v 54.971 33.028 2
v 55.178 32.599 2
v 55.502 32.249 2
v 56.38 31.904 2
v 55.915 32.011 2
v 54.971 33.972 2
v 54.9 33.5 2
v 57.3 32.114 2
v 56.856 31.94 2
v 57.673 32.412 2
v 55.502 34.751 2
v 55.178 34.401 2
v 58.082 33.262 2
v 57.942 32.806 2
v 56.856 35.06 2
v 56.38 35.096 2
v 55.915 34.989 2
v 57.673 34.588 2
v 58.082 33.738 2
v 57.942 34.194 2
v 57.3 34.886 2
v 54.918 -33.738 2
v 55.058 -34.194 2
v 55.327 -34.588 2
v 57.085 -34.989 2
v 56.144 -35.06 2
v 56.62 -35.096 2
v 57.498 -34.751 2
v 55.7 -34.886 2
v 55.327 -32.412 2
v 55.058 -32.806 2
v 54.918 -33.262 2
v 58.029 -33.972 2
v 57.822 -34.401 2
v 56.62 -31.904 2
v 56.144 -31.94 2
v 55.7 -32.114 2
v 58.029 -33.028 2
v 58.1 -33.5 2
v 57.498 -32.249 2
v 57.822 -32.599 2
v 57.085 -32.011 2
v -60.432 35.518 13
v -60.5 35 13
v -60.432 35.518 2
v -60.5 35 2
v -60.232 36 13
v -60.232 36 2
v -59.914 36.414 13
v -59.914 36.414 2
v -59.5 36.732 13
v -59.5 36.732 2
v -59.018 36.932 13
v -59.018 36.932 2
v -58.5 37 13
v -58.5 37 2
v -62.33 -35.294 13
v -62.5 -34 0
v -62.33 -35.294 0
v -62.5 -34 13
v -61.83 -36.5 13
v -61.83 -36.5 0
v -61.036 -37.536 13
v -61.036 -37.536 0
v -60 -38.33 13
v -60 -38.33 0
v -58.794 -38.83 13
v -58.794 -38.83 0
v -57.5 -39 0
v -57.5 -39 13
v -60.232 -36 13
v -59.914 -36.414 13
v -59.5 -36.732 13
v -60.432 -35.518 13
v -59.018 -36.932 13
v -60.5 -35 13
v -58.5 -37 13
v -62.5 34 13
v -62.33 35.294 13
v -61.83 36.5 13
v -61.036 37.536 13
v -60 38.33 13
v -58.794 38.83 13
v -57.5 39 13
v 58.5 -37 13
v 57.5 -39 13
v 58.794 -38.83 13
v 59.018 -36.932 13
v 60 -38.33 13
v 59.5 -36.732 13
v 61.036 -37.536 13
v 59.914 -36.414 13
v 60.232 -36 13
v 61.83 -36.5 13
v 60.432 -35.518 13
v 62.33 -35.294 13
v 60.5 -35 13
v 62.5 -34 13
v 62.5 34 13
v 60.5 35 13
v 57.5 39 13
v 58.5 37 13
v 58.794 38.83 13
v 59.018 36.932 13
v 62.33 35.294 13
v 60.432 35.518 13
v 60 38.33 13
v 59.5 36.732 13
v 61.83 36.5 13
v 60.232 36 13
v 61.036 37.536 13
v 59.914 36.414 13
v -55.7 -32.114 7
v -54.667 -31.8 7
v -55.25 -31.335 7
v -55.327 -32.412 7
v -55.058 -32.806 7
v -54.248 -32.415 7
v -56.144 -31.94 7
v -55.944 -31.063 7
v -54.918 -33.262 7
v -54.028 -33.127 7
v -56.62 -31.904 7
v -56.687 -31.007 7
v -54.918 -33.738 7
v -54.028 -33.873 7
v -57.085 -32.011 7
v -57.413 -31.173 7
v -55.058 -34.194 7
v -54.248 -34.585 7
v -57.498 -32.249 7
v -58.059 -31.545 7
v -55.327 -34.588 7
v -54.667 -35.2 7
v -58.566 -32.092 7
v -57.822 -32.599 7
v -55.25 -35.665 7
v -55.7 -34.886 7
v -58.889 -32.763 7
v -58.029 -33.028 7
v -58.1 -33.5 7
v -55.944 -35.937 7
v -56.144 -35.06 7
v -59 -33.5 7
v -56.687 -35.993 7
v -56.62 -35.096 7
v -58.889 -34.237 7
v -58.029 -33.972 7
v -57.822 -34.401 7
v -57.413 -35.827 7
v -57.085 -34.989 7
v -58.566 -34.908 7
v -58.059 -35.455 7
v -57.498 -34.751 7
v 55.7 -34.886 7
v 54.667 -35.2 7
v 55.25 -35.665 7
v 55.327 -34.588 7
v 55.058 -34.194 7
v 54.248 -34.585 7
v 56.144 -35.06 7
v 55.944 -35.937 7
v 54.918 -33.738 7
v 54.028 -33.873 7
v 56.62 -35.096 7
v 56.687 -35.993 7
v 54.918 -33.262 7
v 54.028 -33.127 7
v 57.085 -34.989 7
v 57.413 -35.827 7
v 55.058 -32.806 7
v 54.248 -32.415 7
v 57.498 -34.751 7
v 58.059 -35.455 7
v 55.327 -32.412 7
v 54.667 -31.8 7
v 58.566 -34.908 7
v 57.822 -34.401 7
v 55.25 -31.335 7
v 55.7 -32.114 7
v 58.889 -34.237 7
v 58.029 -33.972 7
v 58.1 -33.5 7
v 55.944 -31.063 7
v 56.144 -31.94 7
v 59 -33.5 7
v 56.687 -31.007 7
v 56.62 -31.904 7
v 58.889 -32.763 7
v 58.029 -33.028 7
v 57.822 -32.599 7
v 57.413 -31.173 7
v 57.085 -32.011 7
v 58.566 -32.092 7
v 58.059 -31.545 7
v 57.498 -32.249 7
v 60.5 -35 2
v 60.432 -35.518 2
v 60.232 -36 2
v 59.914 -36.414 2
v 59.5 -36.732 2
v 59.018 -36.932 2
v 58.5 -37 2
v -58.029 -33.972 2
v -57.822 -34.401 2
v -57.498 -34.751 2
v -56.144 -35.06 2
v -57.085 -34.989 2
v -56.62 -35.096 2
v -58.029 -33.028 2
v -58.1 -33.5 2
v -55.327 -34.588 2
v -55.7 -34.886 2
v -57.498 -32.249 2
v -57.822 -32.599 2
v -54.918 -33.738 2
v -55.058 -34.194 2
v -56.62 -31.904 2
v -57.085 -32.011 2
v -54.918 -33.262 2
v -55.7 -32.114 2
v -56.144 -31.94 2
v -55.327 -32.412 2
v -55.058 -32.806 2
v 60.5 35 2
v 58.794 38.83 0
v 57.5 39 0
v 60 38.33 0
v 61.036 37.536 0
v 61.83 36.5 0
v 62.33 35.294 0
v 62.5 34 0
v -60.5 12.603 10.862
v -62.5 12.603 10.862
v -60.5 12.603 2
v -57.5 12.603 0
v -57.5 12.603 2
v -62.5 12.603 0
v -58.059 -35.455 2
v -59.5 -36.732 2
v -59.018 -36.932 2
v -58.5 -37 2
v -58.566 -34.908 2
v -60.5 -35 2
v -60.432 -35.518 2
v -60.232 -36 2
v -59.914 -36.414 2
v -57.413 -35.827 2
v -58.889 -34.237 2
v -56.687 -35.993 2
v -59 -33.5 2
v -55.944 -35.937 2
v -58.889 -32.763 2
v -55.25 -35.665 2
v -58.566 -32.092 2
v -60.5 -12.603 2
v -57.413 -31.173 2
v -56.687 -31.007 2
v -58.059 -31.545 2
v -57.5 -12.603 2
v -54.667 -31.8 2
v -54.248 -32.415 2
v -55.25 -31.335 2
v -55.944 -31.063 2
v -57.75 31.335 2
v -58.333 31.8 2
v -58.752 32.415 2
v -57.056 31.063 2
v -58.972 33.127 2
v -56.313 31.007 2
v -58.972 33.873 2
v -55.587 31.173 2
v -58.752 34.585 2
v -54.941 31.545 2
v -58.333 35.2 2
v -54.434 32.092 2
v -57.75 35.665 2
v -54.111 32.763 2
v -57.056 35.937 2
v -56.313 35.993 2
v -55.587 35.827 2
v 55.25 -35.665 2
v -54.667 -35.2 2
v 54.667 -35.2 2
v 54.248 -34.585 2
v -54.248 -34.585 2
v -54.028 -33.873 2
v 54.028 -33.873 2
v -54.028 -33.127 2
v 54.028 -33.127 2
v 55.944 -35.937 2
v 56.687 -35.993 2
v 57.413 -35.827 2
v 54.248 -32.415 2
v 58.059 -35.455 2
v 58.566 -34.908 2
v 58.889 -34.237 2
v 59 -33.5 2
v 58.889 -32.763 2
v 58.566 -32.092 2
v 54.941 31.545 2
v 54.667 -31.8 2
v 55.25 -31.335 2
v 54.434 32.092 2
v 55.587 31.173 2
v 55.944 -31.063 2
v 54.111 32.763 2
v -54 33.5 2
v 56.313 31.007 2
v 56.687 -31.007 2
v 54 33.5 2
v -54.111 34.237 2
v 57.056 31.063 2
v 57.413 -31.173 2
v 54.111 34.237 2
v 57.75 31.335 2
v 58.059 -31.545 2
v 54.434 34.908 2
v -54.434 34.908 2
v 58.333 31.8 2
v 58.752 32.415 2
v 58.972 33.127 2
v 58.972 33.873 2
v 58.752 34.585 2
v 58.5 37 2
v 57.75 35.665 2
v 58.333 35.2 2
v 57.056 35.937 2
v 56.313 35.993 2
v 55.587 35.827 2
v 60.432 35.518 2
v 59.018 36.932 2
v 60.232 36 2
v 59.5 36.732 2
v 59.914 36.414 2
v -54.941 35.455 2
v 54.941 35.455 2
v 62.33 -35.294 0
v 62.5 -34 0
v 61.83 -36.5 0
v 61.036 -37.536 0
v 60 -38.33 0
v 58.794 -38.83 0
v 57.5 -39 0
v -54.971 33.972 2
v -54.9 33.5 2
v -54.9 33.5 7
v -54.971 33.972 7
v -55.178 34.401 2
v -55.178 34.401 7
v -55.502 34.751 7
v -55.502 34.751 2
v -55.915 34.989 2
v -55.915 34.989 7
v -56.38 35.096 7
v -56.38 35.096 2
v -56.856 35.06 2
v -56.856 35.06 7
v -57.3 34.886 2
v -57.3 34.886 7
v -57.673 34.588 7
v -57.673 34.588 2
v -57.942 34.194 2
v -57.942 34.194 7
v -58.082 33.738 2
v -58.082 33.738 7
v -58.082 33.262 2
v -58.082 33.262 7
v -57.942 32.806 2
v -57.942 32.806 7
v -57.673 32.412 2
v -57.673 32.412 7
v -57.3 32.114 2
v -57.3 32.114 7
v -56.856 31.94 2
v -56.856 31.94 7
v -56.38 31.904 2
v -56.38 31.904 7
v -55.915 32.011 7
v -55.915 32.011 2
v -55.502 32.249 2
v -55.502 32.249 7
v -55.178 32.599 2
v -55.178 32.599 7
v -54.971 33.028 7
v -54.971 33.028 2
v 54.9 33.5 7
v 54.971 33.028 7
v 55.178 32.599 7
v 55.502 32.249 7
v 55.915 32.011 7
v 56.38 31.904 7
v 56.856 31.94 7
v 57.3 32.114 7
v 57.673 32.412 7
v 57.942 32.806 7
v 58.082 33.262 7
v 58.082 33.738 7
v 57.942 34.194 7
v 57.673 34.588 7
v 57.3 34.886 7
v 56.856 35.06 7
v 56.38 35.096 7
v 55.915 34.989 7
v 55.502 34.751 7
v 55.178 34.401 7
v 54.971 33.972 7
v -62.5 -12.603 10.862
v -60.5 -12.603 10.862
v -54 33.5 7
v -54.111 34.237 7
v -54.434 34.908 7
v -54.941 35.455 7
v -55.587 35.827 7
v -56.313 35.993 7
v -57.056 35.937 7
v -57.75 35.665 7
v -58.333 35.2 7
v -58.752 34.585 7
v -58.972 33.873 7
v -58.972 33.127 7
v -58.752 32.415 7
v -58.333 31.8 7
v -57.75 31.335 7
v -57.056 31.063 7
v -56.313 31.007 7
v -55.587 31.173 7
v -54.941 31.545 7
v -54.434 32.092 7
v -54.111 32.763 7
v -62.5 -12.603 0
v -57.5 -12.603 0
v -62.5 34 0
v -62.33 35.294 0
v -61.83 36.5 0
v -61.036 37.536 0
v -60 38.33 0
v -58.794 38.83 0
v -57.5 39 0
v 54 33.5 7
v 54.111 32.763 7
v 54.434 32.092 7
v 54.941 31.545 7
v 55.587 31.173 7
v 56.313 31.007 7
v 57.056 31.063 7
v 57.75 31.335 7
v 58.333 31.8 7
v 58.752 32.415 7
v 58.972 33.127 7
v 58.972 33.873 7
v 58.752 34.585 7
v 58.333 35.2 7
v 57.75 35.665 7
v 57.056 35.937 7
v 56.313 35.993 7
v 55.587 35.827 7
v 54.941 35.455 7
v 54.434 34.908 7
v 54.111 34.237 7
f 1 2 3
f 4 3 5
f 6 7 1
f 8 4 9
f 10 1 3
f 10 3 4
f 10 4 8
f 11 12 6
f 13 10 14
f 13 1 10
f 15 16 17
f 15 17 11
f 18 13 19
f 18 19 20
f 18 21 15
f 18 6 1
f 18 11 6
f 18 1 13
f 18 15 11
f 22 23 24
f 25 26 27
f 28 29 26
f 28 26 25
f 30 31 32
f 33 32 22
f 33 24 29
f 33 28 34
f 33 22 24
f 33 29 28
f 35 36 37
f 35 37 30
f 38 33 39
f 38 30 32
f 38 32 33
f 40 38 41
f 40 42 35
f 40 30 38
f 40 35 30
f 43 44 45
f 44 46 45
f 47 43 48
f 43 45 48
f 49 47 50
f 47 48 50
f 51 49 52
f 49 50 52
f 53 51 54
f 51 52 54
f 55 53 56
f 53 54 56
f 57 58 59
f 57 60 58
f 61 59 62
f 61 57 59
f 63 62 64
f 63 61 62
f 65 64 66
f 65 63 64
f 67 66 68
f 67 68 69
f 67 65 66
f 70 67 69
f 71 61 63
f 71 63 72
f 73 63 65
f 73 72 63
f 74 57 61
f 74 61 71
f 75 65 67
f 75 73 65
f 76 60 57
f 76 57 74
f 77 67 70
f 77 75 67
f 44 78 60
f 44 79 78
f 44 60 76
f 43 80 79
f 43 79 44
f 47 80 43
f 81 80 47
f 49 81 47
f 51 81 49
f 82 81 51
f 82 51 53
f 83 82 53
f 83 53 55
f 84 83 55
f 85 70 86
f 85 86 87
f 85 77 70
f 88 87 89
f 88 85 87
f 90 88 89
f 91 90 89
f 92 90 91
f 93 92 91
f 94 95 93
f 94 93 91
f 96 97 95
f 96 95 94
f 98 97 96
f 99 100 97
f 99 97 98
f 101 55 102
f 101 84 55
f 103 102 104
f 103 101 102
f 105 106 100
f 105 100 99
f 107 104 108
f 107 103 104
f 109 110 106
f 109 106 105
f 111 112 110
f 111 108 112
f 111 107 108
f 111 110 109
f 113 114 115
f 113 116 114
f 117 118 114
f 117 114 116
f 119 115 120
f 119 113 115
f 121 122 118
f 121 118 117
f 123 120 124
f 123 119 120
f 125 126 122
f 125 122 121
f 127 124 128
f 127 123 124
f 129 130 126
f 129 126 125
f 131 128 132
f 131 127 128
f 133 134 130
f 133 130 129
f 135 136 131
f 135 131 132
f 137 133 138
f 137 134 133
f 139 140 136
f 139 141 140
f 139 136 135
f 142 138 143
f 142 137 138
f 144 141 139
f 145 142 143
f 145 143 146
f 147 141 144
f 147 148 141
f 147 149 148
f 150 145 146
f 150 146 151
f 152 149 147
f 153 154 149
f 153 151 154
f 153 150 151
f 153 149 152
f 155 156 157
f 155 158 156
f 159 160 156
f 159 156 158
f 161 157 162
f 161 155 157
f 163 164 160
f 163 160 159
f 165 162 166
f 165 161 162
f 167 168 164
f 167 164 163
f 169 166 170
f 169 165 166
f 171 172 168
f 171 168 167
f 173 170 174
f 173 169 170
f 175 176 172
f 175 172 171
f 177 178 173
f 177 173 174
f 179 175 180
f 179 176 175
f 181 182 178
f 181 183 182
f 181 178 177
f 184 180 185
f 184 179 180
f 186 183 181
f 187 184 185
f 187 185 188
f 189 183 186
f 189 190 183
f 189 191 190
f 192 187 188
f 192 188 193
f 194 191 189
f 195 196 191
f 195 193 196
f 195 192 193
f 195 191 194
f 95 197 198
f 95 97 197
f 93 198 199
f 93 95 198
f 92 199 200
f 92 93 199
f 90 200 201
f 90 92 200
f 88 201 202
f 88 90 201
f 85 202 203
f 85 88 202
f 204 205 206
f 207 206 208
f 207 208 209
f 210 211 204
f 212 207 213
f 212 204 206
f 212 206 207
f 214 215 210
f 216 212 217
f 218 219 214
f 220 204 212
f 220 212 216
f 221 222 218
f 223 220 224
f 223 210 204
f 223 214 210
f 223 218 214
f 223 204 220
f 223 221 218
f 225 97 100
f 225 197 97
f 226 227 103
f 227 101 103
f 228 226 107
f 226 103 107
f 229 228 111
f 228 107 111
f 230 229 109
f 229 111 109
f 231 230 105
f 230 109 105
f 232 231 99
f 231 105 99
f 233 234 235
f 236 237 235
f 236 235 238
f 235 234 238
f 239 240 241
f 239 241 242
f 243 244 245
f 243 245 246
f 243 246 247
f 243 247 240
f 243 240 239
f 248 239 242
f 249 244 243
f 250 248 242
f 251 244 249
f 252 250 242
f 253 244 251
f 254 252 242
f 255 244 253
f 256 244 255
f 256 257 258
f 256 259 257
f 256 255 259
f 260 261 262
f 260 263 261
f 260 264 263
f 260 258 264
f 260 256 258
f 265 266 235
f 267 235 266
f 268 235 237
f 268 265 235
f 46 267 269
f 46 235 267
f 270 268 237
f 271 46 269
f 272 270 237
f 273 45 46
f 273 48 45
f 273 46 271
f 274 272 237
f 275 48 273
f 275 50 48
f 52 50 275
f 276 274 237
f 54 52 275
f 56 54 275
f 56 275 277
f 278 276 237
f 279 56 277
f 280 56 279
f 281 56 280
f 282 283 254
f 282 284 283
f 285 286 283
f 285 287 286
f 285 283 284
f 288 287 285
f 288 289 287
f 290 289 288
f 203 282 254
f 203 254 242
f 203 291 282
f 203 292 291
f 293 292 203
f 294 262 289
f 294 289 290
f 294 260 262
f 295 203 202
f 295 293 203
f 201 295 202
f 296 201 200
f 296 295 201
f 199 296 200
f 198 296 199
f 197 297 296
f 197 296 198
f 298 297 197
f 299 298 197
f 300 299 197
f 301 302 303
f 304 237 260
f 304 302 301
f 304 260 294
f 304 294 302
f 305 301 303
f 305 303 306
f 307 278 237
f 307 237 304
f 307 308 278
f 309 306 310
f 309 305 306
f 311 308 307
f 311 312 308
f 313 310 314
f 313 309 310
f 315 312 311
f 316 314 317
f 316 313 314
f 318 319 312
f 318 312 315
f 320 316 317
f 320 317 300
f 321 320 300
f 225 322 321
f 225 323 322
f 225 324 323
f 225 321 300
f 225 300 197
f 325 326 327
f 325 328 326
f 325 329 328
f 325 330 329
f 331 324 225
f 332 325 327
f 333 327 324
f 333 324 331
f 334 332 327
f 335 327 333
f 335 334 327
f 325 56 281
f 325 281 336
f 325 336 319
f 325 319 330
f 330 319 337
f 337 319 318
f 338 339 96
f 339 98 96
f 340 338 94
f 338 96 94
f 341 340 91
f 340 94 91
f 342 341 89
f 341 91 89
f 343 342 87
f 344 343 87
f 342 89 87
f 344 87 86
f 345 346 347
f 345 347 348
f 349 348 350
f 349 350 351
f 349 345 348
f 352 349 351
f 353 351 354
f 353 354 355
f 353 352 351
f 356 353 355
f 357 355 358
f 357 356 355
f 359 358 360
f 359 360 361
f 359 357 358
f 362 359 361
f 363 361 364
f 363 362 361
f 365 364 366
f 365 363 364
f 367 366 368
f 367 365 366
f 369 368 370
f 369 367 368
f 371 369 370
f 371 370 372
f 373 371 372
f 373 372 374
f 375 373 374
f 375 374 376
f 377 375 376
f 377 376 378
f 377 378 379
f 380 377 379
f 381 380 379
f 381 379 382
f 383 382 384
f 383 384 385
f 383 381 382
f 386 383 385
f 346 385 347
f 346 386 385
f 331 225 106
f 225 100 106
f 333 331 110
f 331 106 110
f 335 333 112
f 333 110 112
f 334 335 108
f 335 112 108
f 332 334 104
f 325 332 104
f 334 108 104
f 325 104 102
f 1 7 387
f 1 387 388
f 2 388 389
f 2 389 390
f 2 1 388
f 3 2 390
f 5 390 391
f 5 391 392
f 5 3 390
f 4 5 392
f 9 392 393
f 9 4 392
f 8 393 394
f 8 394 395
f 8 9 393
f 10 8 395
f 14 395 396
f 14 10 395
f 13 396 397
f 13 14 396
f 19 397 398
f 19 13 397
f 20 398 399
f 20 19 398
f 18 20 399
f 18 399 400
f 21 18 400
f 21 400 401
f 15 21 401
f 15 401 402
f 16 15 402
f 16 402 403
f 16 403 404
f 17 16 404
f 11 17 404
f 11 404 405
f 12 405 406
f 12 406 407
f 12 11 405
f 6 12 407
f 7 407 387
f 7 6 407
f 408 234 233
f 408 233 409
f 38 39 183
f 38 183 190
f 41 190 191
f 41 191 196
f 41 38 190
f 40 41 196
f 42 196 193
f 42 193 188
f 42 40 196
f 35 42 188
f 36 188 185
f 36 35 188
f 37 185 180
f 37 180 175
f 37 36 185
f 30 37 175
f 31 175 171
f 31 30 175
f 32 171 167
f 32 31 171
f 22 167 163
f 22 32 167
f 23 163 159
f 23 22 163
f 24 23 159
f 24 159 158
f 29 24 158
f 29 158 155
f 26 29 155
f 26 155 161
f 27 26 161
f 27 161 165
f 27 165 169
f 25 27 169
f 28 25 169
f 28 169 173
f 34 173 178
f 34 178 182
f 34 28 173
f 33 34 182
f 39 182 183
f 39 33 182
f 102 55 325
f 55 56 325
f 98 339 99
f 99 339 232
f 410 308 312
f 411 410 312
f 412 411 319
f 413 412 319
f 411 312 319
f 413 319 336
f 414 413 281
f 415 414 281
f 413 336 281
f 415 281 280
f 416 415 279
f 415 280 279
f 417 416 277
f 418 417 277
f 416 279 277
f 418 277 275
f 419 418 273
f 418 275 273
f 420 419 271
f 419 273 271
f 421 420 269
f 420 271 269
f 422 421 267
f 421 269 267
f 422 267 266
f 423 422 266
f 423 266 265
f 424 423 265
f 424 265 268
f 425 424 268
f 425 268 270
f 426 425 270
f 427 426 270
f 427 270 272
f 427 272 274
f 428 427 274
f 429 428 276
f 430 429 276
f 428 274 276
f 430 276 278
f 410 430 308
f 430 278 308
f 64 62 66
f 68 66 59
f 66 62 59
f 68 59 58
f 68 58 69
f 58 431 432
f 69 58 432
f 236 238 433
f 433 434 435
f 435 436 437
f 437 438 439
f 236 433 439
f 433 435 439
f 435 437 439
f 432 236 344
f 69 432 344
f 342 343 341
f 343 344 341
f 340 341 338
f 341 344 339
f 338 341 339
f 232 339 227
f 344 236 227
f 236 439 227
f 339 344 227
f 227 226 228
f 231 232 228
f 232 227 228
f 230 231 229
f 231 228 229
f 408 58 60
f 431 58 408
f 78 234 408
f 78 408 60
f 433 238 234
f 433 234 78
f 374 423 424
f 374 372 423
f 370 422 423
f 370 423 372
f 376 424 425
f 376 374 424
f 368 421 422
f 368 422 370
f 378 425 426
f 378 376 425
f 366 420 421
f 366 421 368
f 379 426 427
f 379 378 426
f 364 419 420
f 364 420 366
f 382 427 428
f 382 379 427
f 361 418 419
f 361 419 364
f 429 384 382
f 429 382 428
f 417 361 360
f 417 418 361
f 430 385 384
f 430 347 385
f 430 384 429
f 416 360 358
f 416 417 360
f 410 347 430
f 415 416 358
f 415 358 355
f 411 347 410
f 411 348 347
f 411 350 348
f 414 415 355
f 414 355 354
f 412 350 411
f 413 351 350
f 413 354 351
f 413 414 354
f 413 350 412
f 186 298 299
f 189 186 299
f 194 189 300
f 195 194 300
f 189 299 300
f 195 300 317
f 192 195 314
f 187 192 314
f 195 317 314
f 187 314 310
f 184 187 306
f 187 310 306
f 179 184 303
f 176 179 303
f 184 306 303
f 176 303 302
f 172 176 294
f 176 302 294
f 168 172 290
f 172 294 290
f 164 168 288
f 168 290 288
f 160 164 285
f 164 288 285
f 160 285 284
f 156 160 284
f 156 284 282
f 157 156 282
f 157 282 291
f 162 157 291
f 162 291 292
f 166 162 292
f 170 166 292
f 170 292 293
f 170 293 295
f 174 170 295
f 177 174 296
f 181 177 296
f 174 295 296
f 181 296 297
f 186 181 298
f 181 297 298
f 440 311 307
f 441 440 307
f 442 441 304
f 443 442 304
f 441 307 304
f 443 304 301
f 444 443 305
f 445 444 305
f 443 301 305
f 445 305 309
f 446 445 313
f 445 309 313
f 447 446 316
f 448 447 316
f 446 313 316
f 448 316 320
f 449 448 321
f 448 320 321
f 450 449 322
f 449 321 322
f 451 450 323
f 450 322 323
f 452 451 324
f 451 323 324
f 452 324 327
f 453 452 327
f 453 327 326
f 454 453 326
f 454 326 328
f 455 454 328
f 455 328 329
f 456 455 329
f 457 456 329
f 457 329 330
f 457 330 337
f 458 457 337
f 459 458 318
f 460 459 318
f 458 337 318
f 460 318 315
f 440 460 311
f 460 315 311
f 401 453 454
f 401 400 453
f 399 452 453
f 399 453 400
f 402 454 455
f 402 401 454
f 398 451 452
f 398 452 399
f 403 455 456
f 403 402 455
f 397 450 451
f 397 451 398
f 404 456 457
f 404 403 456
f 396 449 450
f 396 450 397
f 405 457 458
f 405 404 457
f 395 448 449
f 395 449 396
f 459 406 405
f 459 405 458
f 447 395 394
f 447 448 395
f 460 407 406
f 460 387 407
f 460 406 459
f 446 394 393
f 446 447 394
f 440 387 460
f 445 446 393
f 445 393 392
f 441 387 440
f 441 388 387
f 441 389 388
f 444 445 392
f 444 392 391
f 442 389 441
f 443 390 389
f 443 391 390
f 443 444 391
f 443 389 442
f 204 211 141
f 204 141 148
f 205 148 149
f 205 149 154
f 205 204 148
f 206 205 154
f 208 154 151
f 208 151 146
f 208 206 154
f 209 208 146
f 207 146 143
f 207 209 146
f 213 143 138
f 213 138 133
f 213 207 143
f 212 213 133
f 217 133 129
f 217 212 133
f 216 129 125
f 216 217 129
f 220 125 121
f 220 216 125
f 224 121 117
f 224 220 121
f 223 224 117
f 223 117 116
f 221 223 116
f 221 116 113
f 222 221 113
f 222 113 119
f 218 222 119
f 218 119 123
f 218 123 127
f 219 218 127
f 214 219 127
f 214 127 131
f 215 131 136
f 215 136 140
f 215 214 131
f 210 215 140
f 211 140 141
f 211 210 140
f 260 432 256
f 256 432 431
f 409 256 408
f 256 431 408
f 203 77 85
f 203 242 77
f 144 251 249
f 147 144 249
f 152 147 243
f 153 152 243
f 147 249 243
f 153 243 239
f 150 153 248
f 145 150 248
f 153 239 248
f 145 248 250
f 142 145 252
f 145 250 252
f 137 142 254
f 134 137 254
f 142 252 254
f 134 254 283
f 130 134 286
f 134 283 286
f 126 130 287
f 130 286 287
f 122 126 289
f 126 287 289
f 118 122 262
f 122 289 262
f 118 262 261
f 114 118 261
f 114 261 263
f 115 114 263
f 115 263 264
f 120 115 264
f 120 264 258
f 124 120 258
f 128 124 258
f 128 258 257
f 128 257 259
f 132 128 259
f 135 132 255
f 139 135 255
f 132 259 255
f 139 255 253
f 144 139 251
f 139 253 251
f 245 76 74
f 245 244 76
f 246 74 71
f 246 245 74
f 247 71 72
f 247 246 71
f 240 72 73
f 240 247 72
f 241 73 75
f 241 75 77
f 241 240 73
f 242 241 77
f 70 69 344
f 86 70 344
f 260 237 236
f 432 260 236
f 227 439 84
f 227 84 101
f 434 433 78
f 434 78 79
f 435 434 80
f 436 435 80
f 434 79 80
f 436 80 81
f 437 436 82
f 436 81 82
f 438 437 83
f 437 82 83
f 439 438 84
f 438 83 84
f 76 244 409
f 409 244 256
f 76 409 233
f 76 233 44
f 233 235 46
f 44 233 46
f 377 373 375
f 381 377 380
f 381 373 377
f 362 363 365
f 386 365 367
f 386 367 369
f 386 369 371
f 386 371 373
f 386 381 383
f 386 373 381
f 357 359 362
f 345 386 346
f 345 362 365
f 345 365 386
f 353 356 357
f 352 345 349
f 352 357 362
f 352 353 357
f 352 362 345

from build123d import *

# Parameters (mm, degrees)
SKETCH_1_W          = 125
SKETCH_1_H          = 78
SKETCH_1_R          = 3.6
SKETCH_1_R_2        = 1.6
SKETCH_1_W_2        = 120
SKETCH_1_H_2        = 74
EXTRUDE_1_DEPTH     = 13
SHELL_1_T           = -2
SKETCH_3_R          = 2.5
SKETCH_3_R_2        = 1.6
EXTRUDE_2_DEPTH     = 5
CUT_EXTRUDE_1_DEPTH = 5
FILLET_1_R          = 5
FILLET_2_R          = 2


with BuildPart() as part:
    # 草图1 → 凸台-拉伸1 (new body)
    # profile 1 of 6: a face of its own
    with BuildSketch(Plane.XY):
        Rectangle(SKETCH_1_W, SKETCH_1_H)
        with Locations((-57, -33.5)):
            Circle(SKETCH_1_R, mode=Mode.SUBTRACT)
        with Locations((-57, 33.5)):
            Circle(SKETCH_1_R, mode=Mode.SUBTRACT)
        with Locations((57, -33.5)):
            Circle(SKETCH_1_R, mode=Mode.SUBTRACT)
        with Locations((57, 33.5)):
            Circle(SKETCH_1_R, mode=Mode.SUBTRACT)
    # profile 2 of 6: a face of its own
    with BuildSketch(Plane.XY):
        with Locations((57, 33.5)):
            Circle(SKETCH_1_R)
        with Locations((57, 33.5)):
            Circle(SKETCH_1_R_2, mode=Mode.SUBTRACT)
    # profile 3 of 6: a face of its own
    with BuildSketch(Plane.XY):
        with Locations((-57, -33.5)):
            Circle(SKETCH_1_R)
        with Locations((-57, -33.5)):
            Circle(SKETCH_1_R_2, mode=Mode.SUBTRACT)
    # profile 4 of 6: a face of its own
    with BuildSketch(Plane.XY):
        with Locations((57, -33.5)):
            Circle(SKETCH_1_R)
        with Locations((57, -33.5)):
            Circle(SKETCH_1_R_2, mode=Mode.SUBTRACT)
    # profile 5 of 6: a face of its own
    with BuildSketch(Plane.XY):
        with Locations((-57, 33.5)):
            Circle(SKETCH_1_R)
        with Locations((-57, 33.5)):
            Circle(SKETCH_1_R_2, mode=Mode.SUBTRACT)
    # profile 6 of 6: a face of its own
    with BuildSketch(Plane.XY):
        Rectangle(SKETCH_1_W_2, SKETCH_1_H_2)
    extrude(amount=EXTRUDE_1_DEPTH)

    # 抽壳1
    shell_1_openings = [part.faces().sort_by_distance(p)[0] for p in [
        (0, 0, 13),
    ]]
    offset(amount=SHELL_1_T, openings=shell_1_openings, kind=Kind.INTERSECTION)

    # 草图3 → 凸台-拉伸2 (add)
    # profile 1 of 4: a face of its own
    with BuildSketch(Plane.XY.offset(2)):
        with Locations((-56.5, 33.5)):
            Circle(SKETCH_3_R)
        with Locations((-56.5, 33.5)):
            Circle(SKETCH_3_R_2, mode=Mode.SUBTRACT)
    # profile 2 of 4: a face of its own
    with BuildSketch(Plane.XY.offset(2)):
        with Locations(Location((56.5, 33.5, 0), (0, 0, 180))):
            Circle(SKETCH_3_R)
        with Locations(Location((56.5, 33.5, 0), (0, 0, 180))):
            Circle(SKETCH_3_R_2, mode=Mode.SUBTRACT)
    # profile 3 of 4: a face of its own
    with BuildSketch(Plane.XY.offset(2)):
        with Locations((56.5, -33.5)):
            Circle(SKETCH_3_R)
        with Locations((56.5, -33.5)):
            Circle(SKETCH_3_R_2, mode=Mode.SUBTRACT)
    # profile 4 of 4: a face of its own
    with BuildSketch(Plane.XY.offset(2)):
        with Locations(Location((-56.5, -33.5, 0), (0, 0, 180))):
            Circle(SKETCH_3_R)
        with Locations(Location((-56.5, -33.5, 0), (0, 0, 180))):
            Circle(SKETCH_3_R_2, mode=Mode.SUBTRACT)
    extrude(amount=EXTRUDE_2_DEPTH)

    # 草图5 → 切除-拉伸1 (cut)
    with BuildSketch(Plane.ZY.offset(62.5)):
        Polygon((2.138422059, 12.60316827), (10.861577941, 12.60316827), (10.861577941, -12.60316827), (2.138422059, -12.60316827), (0, -12.60316827), (0, 12.60316827), align=None)
    extrude(amount=-CUT_EXTRUDE_1_DEPTH, mode=Mode.SUBTRACT)

    # 圆角1
    fillet_1_edges = [part.edges().sort_by_distance(p)[0] for p in [
        (62.5, -39, 6.5),
        (-62.5, -39, 6.5),
        (-62.5, 39, 6.5),
        (62.5, 39, 6.5),
    ]]
    fillet(fillet_1_edges, radius=FILLET_1_R)

    # 圆角2
    fillet_2_edges = [part.edges().sort_by_distance(p)[0] for p in [
        (-60.5, 37, 7.5),
        (60.5, 37, 7.5),
        (60.5, -37, 7.5),
        (-60.5, -37, 7.5),
    ]]
    fillet(fillet_2_edges, radius=FILLET_2_R)


solid = part.part
